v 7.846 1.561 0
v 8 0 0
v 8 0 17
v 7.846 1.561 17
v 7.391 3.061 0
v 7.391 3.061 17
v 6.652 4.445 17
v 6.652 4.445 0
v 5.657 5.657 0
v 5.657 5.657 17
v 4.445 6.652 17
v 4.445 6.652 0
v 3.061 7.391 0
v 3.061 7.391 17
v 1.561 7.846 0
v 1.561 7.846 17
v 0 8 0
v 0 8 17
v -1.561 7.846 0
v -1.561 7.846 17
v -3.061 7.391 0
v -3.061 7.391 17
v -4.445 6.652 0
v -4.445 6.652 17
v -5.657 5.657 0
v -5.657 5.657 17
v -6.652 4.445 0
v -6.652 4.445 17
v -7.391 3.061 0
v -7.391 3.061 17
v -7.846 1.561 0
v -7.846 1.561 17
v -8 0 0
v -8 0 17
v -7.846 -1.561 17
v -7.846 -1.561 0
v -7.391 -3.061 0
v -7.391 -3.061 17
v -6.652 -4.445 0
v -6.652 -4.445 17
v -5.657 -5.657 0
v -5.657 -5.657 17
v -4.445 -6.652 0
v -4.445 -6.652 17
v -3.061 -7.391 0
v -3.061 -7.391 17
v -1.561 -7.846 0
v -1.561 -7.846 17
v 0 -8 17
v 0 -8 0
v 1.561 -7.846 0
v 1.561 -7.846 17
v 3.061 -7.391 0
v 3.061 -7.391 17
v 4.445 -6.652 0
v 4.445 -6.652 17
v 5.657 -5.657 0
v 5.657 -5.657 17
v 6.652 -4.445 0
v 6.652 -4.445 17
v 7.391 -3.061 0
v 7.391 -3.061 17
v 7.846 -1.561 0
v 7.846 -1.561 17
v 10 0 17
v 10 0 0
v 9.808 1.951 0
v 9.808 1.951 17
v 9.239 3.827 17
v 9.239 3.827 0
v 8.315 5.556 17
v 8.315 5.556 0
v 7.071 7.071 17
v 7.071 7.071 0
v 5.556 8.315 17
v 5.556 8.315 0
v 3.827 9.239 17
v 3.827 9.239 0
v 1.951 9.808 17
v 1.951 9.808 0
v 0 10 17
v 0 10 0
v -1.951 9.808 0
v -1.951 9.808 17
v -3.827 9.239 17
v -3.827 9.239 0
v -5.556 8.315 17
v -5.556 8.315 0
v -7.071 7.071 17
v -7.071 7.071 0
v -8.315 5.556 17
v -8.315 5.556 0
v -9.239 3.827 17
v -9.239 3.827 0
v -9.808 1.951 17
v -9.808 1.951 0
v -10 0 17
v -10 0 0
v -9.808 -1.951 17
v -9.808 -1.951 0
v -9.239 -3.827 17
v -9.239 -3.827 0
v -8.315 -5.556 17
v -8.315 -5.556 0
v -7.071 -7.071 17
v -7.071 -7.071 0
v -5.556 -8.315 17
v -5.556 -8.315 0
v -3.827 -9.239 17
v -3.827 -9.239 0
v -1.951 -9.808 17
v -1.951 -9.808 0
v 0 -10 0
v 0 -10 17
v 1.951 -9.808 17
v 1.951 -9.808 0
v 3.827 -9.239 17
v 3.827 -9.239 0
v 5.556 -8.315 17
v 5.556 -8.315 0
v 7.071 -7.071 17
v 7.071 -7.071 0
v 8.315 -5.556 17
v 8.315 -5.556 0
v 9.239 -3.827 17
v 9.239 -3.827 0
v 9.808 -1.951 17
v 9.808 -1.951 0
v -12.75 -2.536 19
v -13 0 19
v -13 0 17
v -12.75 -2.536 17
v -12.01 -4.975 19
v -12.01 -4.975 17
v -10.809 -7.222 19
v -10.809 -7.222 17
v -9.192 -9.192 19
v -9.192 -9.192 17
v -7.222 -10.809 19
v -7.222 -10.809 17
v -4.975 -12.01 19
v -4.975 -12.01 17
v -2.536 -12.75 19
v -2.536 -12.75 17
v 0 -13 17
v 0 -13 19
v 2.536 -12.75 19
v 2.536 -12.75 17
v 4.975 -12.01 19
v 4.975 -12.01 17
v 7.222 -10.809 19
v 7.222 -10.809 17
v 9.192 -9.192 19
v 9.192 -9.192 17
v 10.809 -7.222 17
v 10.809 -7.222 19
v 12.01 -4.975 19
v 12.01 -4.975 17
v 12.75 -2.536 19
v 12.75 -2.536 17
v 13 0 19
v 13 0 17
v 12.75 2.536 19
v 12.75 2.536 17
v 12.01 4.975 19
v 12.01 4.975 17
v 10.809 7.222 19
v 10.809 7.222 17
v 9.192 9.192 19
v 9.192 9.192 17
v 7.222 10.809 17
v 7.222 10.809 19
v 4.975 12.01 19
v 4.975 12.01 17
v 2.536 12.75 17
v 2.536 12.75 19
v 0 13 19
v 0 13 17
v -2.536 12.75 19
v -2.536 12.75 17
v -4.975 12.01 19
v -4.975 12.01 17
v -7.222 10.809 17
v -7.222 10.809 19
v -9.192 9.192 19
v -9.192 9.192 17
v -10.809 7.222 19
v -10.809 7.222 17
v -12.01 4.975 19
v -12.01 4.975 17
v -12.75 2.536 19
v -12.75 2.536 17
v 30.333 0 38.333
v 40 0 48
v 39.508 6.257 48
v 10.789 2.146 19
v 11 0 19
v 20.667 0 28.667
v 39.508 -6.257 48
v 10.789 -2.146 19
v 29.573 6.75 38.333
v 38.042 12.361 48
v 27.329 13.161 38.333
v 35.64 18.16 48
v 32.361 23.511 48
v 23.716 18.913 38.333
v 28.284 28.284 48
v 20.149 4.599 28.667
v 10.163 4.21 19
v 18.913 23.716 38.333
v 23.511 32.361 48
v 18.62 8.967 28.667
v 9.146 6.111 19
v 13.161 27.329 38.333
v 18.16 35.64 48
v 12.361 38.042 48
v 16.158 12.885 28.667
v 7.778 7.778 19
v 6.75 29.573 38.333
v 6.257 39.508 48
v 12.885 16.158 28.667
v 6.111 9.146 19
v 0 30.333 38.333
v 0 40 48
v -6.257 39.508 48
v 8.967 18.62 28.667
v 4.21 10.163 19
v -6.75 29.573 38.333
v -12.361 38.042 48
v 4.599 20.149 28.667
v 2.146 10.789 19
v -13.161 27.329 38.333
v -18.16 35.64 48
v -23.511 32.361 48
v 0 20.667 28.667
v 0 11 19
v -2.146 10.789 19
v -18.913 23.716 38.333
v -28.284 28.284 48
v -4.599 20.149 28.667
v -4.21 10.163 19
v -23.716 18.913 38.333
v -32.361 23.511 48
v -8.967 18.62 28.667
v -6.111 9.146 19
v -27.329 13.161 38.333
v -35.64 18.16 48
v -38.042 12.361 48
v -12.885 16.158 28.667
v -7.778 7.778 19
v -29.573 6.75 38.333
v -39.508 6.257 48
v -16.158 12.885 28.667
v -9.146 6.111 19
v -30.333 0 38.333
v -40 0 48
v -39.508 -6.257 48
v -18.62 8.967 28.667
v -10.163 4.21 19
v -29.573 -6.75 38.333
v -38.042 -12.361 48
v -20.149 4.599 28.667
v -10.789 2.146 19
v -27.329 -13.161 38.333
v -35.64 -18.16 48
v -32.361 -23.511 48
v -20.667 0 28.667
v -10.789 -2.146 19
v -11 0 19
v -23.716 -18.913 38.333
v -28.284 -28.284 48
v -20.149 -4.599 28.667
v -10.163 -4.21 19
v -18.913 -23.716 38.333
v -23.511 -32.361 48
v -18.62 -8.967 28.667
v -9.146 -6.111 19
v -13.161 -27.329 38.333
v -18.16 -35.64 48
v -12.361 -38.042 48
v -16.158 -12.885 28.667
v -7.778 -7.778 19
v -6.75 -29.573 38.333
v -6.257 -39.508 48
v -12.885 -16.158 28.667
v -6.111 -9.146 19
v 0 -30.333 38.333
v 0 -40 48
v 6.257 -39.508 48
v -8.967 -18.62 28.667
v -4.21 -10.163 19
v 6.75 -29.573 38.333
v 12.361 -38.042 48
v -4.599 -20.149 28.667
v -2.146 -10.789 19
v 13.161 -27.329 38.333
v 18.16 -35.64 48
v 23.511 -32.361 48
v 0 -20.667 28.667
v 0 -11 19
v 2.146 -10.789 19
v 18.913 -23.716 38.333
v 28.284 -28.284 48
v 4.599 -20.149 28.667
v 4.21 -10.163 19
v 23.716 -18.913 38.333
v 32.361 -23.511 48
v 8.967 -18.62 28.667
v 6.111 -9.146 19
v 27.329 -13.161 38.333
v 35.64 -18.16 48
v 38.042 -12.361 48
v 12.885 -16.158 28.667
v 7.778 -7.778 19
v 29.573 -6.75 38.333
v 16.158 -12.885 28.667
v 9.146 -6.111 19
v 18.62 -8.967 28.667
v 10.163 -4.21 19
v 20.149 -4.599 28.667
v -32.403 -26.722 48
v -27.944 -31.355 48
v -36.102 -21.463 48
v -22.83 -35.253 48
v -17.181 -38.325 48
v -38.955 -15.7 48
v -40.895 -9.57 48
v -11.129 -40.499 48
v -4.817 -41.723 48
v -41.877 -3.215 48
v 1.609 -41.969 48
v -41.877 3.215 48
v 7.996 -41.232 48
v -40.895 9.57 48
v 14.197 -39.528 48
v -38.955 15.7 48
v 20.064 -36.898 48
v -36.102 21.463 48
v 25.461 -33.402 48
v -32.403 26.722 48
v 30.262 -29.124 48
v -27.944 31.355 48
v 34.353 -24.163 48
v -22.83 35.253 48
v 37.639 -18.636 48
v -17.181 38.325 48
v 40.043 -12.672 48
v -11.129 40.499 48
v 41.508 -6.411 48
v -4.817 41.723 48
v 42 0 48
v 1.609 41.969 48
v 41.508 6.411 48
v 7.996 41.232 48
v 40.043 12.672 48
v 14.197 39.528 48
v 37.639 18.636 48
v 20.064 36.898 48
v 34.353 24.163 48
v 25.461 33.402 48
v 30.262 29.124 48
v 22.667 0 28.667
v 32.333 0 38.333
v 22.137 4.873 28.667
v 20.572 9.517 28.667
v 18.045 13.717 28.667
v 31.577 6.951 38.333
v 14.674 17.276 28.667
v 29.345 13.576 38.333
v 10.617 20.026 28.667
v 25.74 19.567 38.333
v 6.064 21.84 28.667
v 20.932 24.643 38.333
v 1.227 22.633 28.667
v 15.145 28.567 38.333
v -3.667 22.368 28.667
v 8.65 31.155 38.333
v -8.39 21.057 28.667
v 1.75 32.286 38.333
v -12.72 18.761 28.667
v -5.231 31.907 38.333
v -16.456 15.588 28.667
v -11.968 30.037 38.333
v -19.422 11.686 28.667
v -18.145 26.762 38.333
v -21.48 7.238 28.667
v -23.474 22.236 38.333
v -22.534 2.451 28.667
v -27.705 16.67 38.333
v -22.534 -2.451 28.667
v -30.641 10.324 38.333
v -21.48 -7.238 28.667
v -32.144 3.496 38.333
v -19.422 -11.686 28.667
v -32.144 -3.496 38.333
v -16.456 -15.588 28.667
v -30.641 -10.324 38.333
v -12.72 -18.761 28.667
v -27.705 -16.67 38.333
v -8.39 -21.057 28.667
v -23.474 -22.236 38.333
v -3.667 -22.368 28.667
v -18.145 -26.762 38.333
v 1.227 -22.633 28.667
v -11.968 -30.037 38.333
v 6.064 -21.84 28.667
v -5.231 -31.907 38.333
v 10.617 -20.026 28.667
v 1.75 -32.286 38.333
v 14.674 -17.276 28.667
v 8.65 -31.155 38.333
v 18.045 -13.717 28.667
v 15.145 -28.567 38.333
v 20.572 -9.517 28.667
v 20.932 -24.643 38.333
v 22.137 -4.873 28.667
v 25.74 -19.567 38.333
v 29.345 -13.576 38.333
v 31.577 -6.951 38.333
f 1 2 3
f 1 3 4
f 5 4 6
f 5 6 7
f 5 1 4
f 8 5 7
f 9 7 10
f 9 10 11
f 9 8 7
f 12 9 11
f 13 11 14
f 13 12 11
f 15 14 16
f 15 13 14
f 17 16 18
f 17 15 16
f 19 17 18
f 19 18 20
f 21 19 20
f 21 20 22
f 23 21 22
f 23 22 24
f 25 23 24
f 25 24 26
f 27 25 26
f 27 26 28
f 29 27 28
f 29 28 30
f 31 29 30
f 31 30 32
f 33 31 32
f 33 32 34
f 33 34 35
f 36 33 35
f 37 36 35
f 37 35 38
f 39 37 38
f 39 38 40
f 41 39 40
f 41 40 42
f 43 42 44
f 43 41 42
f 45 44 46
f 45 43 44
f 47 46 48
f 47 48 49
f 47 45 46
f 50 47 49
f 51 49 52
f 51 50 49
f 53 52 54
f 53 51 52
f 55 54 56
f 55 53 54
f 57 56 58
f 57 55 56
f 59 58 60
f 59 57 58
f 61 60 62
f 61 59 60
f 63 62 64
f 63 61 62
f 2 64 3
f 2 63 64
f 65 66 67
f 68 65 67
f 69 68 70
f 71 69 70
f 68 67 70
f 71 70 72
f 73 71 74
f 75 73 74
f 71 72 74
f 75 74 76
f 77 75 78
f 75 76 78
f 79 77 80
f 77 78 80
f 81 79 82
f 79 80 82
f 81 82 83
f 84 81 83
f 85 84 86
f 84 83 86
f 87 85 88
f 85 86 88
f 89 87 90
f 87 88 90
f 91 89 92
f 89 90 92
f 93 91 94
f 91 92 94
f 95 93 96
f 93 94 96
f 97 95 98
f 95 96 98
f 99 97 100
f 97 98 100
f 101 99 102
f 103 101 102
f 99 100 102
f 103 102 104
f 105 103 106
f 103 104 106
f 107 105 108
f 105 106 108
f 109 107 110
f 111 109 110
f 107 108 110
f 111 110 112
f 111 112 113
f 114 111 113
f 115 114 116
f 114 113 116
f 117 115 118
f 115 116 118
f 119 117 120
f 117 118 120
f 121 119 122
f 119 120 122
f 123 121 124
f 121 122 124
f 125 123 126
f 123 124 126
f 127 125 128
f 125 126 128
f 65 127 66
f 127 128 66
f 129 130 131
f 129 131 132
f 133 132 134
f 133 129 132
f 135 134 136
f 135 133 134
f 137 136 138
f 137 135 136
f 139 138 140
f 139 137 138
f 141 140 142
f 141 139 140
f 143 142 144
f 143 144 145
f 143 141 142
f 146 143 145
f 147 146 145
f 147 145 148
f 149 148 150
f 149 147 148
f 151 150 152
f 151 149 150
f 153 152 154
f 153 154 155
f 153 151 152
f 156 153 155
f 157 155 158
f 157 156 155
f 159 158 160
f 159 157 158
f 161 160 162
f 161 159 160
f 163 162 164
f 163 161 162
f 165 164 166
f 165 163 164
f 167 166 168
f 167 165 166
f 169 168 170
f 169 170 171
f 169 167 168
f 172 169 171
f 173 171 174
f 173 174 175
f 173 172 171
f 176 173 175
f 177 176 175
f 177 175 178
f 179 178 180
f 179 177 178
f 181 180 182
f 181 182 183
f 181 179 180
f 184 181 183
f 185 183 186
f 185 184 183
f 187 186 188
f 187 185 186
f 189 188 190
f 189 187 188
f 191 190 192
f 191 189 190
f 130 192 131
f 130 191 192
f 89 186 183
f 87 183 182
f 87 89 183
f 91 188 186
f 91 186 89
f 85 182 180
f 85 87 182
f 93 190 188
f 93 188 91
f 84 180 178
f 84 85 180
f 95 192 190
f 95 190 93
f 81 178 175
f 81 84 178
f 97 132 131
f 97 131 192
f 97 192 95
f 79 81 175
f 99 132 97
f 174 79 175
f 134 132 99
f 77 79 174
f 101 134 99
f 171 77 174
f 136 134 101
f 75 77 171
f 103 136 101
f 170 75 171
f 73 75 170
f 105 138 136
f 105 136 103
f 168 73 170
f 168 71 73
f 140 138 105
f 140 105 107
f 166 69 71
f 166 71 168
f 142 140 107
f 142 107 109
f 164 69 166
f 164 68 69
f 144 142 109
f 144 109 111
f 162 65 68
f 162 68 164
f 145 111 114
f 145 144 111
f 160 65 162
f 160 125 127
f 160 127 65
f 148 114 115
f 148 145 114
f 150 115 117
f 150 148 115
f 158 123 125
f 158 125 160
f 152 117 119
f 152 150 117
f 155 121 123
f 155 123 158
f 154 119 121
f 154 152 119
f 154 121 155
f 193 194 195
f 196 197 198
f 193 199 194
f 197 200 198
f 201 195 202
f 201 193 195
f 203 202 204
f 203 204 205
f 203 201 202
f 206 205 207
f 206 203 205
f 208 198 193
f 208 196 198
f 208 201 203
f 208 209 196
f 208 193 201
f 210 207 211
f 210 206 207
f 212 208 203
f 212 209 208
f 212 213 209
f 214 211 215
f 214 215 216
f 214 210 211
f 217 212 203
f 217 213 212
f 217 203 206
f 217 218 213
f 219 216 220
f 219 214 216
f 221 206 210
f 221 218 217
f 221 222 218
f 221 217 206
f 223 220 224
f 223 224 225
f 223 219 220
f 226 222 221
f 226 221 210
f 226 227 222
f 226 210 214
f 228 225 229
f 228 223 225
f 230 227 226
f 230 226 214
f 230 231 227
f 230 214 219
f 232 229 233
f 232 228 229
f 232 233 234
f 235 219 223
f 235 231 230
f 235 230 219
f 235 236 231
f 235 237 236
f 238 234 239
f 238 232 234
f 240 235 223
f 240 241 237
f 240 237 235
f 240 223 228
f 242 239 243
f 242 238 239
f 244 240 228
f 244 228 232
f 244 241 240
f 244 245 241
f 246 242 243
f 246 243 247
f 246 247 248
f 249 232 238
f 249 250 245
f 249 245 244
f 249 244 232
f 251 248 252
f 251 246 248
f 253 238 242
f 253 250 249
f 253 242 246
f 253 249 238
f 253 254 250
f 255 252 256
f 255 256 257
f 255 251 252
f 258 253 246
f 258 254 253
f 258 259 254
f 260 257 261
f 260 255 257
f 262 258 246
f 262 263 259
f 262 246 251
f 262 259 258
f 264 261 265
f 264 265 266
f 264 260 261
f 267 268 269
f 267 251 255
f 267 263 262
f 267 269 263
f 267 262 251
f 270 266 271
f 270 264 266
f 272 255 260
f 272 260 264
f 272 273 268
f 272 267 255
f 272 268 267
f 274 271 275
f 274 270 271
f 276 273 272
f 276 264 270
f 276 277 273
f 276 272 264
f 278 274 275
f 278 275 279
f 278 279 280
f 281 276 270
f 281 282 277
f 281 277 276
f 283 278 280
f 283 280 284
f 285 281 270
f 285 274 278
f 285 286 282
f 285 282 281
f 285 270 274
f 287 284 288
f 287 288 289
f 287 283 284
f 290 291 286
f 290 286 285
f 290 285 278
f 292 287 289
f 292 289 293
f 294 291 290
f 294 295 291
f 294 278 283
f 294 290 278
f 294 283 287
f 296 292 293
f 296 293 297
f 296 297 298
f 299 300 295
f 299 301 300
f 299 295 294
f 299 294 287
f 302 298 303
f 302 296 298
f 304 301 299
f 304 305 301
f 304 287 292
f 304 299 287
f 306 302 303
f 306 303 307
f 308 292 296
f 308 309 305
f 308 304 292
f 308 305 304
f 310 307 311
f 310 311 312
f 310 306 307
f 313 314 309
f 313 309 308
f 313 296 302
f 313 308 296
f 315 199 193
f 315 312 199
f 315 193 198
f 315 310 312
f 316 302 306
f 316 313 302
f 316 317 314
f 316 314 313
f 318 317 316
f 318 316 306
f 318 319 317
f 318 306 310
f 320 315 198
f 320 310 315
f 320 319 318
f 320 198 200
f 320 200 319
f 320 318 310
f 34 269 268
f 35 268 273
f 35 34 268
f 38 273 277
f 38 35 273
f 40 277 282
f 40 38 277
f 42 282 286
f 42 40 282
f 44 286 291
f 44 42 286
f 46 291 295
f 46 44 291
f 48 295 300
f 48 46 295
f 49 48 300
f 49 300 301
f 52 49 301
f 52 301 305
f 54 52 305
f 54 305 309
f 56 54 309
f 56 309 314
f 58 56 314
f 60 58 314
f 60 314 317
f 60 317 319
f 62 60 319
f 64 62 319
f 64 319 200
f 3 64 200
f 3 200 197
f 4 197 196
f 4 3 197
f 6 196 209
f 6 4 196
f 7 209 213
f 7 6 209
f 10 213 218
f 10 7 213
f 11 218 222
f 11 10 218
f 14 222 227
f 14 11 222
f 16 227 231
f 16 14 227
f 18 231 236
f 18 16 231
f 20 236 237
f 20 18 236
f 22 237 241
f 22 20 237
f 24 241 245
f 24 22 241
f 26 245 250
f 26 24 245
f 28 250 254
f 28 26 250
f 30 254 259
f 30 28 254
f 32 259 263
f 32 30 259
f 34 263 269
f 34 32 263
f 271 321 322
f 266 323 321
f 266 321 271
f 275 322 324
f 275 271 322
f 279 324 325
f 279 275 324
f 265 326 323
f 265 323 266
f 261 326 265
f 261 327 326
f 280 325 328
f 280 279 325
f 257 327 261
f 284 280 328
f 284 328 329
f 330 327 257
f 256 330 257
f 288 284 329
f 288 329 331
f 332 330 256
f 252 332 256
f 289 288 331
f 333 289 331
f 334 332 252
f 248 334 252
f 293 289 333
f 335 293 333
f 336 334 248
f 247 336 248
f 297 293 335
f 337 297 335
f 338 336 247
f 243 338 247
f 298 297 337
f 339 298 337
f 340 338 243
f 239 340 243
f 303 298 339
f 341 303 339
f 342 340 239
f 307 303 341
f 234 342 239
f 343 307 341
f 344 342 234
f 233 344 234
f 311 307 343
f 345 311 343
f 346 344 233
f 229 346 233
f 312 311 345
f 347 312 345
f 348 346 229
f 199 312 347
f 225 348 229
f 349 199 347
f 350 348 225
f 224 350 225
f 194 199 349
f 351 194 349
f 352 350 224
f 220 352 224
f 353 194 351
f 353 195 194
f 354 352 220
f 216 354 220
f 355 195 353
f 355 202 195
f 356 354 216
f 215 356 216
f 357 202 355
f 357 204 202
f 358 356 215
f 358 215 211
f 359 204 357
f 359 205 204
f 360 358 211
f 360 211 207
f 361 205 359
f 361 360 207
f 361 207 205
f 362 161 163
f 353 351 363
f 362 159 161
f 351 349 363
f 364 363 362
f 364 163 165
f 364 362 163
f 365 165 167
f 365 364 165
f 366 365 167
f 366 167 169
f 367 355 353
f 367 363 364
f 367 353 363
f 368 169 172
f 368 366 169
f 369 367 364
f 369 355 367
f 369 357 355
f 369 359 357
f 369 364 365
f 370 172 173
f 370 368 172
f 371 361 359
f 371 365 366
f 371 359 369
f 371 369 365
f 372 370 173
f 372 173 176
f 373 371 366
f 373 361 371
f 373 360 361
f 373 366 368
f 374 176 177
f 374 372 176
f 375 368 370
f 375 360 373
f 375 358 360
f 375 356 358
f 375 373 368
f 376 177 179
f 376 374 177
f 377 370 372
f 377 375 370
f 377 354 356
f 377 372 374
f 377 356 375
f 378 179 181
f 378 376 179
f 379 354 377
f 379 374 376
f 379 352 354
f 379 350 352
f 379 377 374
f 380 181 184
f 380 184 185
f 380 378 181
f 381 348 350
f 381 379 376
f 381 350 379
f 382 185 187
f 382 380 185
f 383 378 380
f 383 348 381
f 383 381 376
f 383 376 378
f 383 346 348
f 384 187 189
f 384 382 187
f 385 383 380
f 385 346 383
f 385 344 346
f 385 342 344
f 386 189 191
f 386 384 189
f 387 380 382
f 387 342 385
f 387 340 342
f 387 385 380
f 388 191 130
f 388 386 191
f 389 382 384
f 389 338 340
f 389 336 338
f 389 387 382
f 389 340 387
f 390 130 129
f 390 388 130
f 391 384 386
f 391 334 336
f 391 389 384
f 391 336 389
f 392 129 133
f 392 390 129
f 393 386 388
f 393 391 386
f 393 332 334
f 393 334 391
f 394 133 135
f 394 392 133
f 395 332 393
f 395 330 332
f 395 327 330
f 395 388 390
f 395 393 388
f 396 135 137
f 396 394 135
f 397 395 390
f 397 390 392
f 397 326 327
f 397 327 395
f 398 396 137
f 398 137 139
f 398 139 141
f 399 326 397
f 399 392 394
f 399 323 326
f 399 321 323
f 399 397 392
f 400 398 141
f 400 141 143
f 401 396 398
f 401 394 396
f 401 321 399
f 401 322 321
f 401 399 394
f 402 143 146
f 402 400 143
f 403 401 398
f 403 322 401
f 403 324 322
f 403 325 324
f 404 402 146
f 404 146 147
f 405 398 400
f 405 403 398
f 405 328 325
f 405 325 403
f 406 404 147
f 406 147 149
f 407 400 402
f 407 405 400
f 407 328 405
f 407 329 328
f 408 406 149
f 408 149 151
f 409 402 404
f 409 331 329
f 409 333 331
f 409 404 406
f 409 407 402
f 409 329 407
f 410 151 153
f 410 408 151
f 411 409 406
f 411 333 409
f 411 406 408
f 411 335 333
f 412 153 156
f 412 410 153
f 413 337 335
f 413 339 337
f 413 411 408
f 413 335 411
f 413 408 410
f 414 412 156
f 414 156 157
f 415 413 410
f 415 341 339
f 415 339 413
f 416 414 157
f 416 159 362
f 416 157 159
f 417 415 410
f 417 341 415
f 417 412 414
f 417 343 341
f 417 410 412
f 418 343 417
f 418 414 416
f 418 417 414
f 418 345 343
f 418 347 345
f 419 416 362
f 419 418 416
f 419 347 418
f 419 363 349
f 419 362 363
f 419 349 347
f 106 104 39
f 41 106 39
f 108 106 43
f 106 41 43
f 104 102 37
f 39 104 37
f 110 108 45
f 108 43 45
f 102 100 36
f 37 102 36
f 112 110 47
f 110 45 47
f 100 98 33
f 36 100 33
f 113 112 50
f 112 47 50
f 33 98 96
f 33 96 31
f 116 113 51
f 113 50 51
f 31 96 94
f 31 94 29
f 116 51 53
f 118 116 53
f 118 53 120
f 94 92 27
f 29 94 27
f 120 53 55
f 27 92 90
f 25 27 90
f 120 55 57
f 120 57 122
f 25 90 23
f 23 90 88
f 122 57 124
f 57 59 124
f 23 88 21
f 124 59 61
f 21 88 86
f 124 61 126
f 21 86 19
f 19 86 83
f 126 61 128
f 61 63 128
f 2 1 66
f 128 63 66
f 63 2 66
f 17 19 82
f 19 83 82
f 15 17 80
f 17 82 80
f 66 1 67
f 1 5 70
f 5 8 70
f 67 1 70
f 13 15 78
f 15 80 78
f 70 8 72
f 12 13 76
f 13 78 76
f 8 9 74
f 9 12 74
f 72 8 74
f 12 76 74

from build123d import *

# Parameters (mm, degrees)
SKETCH1_R           = 10
SKETCH1_R_2         = 8
BOSS_EXTRUDE1_DEPTH = 17


with BuildPart() as part:
    # Sketch1 → Boss-Extrude1 (new body)
    with BuildSketch(Plane.XY):
        Circle(SKETCH1_R)
        Circle(SKETCH1_R_2, mode=Mode.SUBTRACT)
    extrude(amount=BOSS_EXTRUDE1_DEPTH)

    # Sketch3 → Revolve1 (revolve)
    with BuildSketch(Plane(origin=(0, 0, 0), x_dir=(1, 0, 0), z_dir=(0, 1, 0))):
        Polygon((-10, -17), (-13, -17), (-13, -19), (-11, -19), (-8, -17), align=None)
    revolve(axis=Axis((0, 0, 0), (0, 0, 1)))

    # Sketch5 → Revolve2 (revolve)
    with BuildSketch(Plane(origin=(0, 0, 0), x_dir=(1, 0, 0), z_dir=(0, 1, 0)), mode=Mode.PRIVATE) as revolve2_sk:
        Polygon((-13, -19), (-42, -48), (-40, -48), (-11, -19), align=None)
    revolve(revolve2_sk.sketch.rotate(Axis((0, 0, 0), (0, 0, 1)), 180), axis=Axis((0, 0, 0), (0, 0, 1)))


solid = part.part
